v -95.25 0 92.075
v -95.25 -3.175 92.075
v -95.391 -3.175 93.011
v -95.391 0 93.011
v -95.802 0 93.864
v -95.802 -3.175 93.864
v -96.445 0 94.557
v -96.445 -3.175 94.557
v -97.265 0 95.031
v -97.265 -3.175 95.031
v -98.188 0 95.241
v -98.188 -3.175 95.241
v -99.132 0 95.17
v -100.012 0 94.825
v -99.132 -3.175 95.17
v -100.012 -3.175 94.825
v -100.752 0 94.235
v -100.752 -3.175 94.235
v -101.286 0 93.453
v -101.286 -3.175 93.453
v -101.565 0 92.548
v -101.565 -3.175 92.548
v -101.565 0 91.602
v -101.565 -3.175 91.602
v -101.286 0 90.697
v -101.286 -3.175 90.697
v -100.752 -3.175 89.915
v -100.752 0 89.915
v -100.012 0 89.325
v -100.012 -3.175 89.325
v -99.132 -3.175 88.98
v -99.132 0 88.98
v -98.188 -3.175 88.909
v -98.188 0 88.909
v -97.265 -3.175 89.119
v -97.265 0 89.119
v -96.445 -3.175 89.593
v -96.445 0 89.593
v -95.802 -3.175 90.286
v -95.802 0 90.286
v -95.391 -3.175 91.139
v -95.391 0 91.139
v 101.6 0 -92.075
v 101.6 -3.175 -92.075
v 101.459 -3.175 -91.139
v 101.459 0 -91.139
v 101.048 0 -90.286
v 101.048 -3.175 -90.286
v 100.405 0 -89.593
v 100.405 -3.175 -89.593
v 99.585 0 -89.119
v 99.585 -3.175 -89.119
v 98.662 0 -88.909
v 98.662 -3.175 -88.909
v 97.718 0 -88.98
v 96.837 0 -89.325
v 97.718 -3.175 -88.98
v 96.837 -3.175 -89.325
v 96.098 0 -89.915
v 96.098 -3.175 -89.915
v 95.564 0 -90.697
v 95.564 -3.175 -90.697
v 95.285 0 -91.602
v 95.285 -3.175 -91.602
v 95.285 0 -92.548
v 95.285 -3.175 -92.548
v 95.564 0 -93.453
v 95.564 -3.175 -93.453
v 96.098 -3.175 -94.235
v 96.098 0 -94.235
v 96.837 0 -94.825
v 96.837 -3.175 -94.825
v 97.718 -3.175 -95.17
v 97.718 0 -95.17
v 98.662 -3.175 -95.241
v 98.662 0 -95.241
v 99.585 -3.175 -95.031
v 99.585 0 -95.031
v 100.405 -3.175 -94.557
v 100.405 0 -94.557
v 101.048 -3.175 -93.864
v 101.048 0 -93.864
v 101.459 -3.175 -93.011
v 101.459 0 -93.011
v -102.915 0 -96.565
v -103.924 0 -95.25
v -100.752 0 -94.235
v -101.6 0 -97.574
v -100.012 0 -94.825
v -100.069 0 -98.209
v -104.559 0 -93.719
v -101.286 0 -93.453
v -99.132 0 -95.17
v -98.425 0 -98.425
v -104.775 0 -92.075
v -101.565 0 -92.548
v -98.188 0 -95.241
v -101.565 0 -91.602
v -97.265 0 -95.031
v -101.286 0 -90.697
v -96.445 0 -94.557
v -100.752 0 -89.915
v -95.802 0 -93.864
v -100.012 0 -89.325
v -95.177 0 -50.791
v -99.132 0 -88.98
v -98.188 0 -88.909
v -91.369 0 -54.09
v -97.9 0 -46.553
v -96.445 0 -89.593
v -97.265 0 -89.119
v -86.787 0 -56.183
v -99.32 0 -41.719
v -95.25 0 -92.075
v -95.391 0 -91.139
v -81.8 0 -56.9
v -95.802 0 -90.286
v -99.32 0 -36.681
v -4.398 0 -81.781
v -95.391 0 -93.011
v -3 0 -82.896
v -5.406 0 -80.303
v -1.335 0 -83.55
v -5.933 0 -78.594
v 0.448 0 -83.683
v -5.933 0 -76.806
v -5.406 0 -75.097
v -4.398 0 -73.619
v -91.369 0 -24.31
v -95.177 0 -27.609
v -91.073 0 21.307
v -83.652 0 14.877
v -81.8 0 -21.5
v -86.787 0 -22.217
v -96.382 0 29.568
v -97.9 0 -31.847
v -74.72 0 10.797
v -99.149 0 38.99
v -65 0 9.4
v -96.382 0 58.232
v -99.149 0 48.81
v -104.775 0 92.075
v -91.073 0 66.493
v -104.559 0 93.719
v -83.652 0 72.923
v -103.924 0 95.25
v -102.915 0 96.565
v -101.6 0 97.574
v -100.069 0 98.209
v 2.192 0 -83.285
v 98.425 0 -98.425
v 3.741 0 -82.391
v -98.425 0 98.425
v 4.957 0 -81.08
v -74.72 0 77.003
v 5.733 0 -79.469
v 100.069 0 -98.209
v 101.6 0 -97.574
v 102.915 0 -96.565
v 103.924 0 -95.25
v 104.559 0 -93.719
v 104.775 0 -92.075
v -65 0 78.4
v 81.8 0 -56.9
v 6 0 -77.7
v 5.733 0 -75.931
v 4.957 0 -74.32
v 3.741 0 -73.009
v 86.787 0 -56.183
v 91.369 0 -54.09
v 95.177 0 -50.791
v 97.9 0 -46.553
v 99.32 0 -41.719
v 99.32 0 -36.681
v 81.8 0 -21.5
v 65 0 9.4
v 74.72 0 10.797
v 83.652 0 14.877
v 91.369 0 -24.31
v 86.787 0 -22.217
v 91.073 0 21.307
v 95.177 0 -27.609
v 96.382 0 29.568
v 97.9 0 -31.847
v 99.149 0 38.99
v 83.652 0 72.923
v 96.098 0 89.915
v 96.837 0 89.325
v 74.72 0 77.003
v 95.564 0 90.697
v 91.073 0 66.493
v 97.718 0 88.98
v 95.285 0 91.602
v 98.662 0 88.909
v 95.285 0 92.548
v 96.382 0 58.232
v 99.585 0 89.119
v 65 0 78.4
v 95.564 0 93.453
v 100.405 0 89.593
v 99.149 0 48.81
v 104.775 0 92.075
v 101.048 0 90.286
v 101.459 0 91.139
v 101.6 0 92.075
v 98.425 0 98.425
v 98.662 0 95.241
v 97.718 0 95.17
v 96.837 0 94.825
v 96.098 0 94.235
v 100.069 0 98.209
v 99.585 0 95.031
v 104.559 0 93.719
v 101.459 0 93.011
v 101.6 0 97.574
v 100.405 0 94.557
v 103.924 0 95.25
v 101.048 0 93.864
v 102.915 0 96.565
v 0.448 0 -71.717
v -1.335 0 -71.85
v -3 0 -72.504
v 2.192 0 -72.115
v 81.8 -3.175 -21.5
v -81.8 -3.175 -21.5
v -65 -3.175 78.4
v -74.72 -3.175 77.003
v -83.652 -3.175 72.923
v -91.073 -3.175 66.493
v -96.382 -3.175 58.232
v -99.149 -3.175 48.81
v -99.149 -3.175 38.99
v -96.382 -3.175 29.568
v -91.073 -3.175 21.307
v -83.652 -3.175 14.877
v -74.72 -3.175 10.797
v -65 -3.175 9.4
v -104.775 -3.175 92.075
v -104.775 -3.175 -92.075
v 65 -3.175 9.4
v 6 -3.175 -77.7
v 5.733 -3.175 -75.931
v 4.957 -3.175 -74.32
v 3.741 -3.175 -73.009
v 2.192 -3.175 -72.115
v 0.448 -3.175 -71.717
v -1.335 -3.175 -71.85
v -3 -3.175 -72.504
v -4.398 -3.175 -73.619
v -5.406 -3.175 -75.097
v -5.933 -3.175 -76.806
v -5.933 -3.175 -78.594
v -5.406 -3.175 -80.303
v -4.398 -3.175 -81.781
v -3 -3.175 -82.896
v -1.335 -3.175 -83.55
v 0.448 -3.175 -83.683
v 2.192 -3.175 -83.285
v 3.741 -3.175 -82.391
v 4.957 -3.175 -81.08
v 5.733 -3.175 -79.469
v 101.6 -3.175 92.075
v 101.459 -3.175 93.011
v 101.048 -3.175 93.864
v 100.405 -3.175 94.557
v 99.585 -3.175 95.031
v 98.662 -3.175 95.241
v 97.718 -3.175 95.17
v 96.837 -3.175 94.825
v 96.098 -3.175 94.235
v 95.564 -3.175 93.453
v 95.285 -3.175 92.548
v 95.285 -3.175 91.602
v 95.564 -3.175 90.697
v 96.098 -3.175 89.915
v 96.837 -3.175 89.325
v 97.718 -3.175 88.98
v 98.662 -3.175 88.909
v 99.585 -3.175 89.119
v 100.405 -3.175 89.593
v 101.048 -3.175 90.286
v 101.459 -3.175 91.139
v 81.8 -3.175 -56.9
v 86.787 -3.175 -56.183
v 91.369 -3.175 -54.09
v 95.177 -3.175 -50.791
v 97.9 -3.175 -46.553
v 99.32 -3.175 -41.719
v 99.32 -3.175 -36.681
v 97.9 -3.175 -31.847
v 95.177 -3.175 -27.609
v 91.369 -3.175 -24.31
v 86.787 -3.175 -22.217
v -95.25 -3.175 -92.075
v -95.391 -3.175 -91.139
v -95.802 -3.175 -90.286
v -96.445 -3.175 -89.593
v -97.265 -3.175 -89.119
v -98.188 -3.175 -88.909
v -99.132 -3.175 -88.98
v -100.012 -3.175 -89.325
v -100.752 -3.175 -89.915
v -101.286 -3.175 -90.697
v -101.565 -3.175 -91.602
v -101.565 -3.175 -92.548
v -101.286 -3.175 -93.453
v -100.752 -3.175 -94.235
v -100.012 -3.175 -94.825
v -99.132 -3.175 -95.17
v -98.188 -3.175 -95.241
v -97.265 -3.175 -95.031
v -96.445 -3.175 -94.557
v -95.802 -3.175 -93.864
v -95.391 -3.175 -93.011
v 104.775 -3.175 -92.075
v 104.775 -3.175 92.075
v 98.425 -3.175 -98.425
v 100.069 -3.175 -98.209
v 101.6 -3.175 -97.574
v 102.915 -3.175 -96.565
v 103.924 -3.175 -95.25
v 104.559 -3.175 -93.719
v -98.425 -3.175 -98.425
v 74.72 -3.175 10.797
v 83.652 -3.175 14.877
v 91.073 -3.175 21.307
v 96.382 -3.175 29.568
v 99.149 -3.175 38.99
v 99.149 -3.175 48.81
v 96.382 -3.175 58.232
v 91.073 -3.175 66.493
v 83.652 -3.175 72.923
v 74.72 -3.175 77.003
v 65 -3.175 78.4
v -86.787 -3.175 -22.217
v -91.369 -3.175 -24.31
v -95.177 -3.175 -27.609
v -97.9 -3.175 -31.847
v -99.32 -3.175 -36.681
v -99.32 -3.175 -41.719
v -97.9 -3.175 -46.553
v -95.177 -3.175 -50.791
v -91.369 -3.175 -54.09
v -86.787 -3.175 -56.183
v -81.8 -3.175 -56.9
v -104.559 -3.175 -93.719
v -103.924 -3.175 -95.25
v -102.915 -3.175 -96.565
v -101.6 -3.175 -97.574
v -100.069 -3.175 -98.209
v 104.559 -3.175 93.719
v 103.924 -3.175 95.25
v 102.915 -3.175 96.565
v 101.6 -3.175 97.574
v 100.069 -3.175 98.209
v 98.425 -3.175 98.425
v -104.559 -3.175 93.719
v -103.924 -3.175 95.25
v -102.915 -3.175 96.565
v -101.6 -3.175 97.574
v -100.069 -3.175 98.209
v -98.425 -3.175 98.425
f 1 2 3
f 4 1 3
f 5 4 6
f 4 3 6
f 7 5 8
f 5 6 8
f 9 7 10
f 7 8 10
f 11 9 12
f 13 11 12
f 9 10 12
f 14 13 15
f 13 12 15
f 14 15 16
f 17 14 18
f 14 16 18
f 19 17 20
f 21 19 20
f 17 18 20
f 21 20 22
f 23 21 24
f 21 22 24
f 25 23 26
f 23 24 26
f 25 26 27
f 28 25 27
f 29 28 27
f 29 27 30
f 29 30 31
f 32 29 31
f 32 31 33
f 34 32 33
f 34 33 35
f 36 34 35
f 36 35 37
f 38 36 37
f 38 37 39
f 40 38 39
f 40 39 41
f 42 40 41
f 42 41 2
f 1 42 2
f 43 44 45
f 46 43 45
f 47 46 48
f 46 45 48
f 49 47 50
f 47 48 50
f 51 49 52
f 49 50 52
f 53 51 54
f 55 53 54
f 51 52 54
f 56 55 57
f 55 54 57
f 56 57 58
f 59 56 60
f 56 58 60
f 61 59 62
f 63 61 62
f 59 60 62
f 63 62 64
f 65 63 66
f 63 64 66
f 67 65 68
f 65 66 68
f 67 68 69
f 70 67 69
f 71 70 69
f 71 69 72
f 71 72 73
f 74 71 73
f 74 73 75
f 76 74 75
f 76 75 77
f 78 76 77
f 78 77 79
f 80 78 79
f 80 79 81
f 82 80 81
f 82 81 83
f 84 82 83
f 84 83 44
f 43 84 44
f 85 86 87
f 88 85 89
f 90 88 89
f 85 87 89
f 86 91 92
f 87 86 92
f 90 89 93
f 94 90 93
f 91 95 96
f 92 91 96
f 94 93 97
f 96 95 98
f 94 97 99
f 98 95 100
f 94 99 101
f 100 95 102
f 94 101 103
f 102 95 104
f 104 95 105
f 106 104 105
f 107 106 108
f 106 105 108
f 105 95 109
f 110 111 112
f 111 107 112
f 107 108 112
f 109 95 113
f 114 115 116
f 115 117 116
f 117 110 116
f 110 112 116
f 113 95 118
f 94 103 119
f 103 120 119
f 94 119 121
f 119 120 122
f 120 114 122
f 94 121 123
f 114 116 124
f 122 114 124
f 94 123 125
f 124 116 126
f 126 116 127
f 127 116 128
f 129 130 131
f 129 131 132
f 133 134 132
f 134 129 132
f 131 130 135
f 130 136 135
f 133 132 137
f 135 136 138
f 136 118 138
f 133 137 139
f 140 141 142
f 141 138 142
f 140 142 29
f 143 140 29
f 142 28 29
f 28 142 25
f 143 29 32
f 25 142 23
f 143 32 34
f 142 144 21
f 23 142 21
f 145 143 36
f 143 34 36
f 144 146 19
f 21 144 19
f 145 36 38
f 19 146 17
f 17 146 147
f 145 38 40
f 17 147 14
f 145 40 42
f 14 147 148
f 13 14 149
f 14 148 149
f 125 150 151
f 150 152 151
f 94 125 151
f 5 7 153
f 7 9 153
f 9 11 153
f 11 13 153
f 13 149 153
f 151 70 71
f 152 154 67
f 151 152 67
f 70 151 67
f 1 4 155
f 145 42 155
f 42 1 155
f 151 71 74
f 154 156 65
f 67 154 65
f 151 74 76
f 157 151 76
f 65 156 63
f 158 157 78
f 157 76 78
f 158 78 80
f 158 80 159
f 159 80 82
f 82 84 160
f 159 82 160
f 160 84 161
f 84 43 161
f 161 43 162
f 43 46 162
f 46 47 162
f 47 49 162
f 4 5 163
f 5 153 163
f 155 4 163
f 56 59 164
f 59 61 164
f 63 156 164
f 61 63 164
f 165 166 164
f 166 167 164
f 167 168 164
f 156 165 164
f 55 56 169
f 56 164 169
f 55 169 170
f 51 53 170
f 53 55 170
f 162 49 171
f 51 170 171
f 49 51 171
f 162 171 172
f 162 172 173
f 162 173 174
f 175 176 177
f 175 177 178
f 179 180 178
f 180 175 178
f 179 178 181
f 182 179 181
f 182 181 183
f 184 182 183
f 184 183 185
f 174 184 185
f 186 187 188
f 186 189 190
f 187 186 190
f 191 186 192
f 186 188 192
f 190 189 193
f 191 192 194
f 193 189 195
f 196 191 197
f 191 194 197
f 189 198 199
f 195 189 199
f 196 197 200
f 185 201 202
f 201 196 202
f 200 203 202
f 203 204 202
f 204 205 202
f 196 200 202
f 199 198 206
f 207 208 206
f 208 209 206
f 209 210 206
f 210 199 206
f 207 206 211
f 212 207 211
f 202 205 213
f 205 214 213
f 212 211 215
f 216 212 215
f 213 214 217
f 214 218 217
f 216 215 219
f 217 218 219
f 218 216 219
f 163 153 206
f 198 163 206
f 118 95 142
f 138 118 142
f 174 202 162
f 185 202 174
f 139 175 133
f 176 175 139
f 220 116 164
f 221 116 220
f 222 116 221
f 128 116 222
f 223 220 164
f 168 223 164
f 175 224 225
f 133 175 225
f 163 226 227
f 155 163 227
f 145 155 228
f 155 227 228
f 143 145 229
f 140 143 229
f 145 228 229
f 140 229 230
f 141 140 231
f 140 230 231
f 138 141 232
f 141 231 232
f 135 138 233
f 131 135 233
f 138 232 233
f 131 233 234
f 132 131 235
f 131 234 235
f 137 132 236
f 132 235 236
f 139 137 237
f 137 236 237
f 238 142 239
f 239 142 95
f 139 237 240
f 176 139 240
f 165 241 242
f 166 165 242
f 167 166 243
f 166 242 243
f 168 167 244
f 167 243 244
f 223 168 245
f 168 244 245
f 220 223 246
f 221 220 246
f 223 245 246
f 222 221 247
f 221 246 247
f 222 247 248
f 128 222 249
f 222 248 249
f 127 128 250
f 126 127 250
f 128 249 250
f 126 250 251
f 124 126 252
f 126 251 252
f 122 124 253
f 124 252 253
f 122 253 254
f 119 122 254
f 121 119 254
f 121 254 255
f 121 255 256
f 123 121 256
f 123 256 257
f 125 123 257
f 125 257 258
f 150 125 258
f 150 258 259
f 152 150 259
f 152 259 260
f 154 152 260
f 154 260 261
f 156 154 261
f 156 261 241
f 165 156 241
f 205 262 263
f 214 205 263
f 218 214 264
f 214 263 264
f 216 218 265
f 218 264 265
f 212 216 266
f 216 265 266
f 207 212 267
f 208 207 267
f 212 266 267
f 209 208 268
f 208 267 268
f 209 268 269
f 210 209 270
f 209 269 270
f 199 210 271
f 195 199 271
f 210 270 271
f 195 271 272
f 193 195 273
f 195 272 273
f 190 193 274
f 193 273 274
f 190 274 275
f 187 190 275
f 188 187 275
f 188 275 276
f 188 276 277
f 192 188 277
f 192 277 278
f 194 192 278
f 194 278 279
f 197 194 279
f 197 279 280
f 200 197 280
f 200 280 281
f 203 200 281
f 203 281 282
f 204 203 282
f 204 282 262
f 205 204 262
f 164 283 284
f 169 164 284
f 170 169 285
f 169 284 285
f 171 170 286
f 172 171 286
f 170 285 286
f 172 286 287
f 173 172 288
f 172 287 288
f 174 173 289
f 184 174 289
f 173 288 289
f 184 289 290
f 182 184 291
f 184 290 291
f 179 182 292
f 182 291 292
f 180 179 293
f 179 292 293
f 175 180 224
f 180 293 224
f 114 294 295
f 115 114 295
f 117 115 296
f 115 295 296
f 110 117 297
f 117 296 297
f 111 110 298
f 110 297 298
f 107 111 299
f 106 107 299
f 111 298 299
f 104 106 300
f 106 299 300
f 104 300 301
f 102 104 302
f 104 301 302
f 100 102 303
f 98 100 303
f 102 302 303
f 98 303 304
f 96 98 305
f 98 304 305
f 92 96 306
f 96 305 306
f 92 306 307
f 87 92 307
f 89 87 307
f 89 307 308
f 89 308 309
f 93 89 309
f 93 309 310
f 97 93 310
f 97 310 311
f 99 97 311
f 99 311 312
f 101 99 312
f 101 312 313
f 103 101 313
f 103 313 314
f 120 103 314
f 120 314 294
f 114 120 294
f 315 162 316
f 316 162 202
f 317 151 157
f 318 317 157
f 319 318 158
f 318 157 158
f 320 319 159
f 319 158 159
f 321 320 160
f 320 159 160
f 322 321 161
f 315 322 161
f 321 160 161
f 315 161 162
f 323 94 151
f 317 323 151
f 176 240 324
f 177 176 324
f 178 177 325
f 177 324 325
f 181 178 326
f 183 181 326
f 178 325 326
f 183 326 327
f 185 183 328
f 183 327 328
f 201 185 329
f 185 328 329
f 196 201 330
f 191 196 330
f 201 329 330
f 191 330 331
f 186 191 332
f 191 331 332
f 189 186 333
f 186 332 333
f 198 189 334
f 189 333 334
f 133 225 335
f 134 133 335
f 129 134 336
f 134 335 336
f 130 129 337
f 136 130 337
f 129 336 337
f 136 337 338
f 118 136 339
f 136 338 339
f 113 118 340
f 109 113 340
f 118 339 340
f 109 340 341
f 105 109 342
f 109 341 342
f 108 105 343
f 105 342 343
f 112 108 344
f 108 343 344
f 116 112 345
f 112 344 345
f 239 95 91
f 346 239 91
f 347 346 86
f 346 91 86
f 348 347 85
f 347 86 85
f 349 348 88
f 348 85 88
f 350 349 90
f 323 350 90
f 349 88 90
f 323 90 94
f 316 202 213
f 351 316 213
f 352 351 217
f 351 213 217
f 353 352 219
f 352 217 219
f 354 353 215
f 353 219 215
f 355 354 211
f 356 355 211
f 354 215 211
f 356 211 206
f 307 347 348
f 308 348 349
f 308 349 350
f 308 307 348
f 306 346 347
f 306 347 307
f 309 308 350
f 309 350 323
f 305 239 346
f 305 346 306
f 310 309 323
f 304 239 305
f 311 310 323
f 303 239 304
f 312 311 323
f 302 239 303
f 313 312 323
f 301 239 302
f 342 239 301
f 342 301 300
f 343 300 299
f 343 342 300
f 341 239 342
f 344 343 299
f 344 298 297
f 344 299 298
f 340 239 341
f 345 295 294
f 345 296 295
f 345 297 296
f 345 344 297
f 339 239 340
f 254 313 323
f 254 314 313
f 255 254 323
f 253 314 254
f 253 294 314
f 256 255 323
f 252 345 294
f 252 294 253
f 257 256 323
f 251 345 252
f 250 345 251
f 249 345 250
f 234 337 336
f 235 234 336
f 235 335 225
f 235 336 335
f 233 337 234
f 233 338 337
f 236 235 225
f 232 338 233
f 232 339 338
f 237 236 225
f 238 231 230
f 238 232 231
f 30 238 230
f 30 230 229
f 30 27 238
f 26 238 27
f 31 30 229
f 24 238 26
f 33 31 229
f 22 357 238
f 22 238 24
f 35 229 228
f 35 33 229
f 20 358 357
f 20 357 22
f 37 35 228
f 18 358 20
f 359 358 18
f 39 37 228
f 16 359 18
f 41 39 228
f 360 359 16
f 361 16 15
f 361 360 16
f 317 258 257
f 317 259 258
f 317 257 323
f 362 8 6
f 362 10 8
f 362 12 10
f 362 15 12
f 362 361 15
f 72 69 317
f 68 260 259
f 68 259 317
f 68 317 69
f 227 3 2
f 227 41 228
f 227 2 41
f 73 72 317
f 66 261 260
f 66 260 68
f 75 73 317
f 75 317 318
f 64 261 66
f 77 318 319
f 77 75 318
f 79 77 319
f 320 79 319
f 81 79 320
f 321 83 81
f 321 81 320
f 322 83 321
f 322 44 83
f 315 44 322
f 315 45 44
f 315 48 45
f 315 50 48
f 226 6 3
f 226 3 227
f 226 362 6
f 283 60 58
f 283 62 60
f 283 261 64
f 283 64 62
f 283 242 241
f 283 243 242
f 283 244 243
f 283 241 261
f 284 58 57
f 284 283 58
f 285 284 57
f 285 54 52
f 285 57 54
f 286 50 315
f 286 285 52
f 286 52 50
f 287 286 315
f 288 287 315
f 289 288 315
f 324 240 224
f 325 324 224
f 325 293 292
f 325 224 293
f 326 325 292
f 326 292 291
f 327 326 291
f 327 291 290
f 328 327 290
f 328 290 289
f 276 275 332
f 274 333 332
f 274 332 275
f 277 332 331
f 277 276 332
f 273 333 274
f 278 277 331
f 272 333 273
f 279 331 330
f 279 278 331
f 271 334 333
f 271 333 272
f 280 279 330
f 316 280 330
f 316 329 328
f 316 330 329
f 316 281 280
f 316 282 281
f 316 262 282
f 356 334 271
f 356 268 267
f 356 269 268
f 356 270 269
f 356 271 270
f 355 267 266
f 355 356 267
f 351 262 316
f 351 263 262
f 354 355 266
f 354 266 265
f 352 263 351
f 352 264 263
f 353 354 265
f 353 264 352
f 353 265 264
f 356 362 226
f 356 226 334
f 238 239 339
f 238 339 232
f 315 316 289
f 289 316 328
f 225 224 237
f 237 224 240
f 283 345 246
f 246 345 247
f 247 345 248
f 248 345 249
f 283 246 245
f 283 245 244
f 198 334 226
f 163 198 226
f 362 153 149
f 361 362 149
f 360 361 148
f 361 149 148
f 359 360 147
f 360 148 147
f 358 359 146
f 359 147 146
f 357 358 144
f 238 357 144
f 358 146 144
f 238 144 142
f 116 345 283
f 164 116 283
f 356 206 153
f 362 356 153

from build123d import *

# Parameters (mm, degrees)
F1_DEPTH = 3.175
F2_R     = 3.175
F3_DEPTH = 25.4
F5_DEPTH = 25
F6_DEPTH = 25
F7_DEPTH = 25
F8_R     = 6
F9_DEPTH = 25


with BuildPart() as f1:
    # F0 (on Front) → F1 (new body)
    with BuildSketch(Plane.XZ):
        with BuildLine():
            Line((98.425, 98.425), (-98.425, 98.425))
            ThreePointArc((-98.425, 98.425), (-102.915128, 96.565128), (-104.775, 92.075))
            Line((-104.775, 92.075), (-104.775, -92.075))
            ThreePointArc((-104.775, -92.075), (-102.915128, -96.565128), (-98.425, -98.425))
            Line((-98.425, -98.425), (98.425, -98.425))
            ThreePointArc((98.425, -98.425), (102.915128, -96.565128), (104.775, -92.075))
            Line((104.775, -92.075), (104.775, 92.075))
            ThreePointArc((104.775, 92.075), (102.915128, 96.565128), (98.425, 98.425))
        make_face()
    extrude(amount=F1_DEPTH)

    # F2 (on face) → F3 (cut)
    with BuildSketch(Plane.XZ.offset(3.175)):
        with Locations((-98.425, 92.075)):
            Circle(F2_R)
        with Locations((98.425, 92.075)):
            Circle(F2_R)
        with Locations((98.425, -92.075)):
            Circle(F2_R)
        with Locations((-98.425, -92.075)):
            Circle(F2_R)
    extrude(amount=-F3_DEPTH, mode=Mode.SUBTRACT)

    # F4 (on face) → F5 (cut)
    with BuildSketch(Plane.XZ.offset(3.175)):
        with BuildLine():
            ThreePointArc((-65, 78.4), (-99.5, 43.9), (-65, 9.4))
            Line((-65, 9.4), (65, 9.4))
            ThreePointArc((65, 9.4), (99.5, 43.9), (65, 78.4))
            Line((65, 78.4), (-65, 78.4))
        make_face()
        with BuildLine():
            ThreePointArc((-81.8, -21.5), (-99.5, -39.2), (-81.8, -56.9))
            Line((-81.8, -56.9), (81.8, -56.9))
            ThreePointArc((81.8, -56.9), (99.5, -39.2), (81.8, -21.5))
            Line((81.8, -21.5), (-81.8, -21.5))
        make_face()
    extrude(amount=-F5_DEPTH, mode=Mode.SUBTRACT)

    # F4 (on face) → F6 (cut)
    with BuildSketch(Plane.XZ.offset(3.175)):
        with BuildLine():
            ThreePointArc((-65, 78.4), (-99.5, 43.9), (-65, 9.4))
            Line((-65, 9.4), (65, 9.4))
            ThreePointArc((65, 9.4), (99.5, 43.9), (65, 78.4))
            Line((65, 78.4), (-65, 78.4))
        make_face()
        with BuildLine():
            ThreePointArc((-81.8, -21.5), (-99.5, -39.2), (-81.8, -56.9))
            Line((-81.8, -56.9), (81.8, -56.9))
            ThreePointArc((81.8, -56.9), (99.5, -39.2), (81.8, -21.5))
            Line((81.8, -21.5), (-81.8, -21.5))
        make_face()
    extrude(amount=-F6_DEPTH, mode=Mode.SUBTRACT)

    # F4 (on face) → F7 (cut)
    with BuildSketch(Plane.XZ.offset(3.175)):
        with BuildLine():
            ThreePointArc((-65, 78.4), (-99.5, 43.9), (-65, 9.4))
            Line((-65, 9.4), (65, 9.4))
            ThreePointArc((65, 9.4), (99.5, 43.9), (65, 78.4))
            Line((65, 78.4), (-65, 78.4))
        make_face()
        with BuildLine():
            ThreePointArc((-81.8, -21.5), (-99.5, -39.2), (-81.8, -56.9))
            Line((-81.8, -56.9), (81.8, -56.9))
            ThreePointArc((81.8, -56.9), (99.5, -39.2), (81.8, -21.5))
            Line((81.8, -21.5), (-81.8, -21.5))
        make_face()
    extrude(amount=-F7_DEPTH, mode=Mode.SUBTRACT)

    # F8 (on face) → F9 (cut)
    with BuildSketch(Plane.XZ.offset(3.175)):
        with Locations((0, -77.7)):
            Circle(F8_R)
    extrude(amount=-F9_DEPTH, mode=Mode.SUBTRACT)


solid = f1.part
